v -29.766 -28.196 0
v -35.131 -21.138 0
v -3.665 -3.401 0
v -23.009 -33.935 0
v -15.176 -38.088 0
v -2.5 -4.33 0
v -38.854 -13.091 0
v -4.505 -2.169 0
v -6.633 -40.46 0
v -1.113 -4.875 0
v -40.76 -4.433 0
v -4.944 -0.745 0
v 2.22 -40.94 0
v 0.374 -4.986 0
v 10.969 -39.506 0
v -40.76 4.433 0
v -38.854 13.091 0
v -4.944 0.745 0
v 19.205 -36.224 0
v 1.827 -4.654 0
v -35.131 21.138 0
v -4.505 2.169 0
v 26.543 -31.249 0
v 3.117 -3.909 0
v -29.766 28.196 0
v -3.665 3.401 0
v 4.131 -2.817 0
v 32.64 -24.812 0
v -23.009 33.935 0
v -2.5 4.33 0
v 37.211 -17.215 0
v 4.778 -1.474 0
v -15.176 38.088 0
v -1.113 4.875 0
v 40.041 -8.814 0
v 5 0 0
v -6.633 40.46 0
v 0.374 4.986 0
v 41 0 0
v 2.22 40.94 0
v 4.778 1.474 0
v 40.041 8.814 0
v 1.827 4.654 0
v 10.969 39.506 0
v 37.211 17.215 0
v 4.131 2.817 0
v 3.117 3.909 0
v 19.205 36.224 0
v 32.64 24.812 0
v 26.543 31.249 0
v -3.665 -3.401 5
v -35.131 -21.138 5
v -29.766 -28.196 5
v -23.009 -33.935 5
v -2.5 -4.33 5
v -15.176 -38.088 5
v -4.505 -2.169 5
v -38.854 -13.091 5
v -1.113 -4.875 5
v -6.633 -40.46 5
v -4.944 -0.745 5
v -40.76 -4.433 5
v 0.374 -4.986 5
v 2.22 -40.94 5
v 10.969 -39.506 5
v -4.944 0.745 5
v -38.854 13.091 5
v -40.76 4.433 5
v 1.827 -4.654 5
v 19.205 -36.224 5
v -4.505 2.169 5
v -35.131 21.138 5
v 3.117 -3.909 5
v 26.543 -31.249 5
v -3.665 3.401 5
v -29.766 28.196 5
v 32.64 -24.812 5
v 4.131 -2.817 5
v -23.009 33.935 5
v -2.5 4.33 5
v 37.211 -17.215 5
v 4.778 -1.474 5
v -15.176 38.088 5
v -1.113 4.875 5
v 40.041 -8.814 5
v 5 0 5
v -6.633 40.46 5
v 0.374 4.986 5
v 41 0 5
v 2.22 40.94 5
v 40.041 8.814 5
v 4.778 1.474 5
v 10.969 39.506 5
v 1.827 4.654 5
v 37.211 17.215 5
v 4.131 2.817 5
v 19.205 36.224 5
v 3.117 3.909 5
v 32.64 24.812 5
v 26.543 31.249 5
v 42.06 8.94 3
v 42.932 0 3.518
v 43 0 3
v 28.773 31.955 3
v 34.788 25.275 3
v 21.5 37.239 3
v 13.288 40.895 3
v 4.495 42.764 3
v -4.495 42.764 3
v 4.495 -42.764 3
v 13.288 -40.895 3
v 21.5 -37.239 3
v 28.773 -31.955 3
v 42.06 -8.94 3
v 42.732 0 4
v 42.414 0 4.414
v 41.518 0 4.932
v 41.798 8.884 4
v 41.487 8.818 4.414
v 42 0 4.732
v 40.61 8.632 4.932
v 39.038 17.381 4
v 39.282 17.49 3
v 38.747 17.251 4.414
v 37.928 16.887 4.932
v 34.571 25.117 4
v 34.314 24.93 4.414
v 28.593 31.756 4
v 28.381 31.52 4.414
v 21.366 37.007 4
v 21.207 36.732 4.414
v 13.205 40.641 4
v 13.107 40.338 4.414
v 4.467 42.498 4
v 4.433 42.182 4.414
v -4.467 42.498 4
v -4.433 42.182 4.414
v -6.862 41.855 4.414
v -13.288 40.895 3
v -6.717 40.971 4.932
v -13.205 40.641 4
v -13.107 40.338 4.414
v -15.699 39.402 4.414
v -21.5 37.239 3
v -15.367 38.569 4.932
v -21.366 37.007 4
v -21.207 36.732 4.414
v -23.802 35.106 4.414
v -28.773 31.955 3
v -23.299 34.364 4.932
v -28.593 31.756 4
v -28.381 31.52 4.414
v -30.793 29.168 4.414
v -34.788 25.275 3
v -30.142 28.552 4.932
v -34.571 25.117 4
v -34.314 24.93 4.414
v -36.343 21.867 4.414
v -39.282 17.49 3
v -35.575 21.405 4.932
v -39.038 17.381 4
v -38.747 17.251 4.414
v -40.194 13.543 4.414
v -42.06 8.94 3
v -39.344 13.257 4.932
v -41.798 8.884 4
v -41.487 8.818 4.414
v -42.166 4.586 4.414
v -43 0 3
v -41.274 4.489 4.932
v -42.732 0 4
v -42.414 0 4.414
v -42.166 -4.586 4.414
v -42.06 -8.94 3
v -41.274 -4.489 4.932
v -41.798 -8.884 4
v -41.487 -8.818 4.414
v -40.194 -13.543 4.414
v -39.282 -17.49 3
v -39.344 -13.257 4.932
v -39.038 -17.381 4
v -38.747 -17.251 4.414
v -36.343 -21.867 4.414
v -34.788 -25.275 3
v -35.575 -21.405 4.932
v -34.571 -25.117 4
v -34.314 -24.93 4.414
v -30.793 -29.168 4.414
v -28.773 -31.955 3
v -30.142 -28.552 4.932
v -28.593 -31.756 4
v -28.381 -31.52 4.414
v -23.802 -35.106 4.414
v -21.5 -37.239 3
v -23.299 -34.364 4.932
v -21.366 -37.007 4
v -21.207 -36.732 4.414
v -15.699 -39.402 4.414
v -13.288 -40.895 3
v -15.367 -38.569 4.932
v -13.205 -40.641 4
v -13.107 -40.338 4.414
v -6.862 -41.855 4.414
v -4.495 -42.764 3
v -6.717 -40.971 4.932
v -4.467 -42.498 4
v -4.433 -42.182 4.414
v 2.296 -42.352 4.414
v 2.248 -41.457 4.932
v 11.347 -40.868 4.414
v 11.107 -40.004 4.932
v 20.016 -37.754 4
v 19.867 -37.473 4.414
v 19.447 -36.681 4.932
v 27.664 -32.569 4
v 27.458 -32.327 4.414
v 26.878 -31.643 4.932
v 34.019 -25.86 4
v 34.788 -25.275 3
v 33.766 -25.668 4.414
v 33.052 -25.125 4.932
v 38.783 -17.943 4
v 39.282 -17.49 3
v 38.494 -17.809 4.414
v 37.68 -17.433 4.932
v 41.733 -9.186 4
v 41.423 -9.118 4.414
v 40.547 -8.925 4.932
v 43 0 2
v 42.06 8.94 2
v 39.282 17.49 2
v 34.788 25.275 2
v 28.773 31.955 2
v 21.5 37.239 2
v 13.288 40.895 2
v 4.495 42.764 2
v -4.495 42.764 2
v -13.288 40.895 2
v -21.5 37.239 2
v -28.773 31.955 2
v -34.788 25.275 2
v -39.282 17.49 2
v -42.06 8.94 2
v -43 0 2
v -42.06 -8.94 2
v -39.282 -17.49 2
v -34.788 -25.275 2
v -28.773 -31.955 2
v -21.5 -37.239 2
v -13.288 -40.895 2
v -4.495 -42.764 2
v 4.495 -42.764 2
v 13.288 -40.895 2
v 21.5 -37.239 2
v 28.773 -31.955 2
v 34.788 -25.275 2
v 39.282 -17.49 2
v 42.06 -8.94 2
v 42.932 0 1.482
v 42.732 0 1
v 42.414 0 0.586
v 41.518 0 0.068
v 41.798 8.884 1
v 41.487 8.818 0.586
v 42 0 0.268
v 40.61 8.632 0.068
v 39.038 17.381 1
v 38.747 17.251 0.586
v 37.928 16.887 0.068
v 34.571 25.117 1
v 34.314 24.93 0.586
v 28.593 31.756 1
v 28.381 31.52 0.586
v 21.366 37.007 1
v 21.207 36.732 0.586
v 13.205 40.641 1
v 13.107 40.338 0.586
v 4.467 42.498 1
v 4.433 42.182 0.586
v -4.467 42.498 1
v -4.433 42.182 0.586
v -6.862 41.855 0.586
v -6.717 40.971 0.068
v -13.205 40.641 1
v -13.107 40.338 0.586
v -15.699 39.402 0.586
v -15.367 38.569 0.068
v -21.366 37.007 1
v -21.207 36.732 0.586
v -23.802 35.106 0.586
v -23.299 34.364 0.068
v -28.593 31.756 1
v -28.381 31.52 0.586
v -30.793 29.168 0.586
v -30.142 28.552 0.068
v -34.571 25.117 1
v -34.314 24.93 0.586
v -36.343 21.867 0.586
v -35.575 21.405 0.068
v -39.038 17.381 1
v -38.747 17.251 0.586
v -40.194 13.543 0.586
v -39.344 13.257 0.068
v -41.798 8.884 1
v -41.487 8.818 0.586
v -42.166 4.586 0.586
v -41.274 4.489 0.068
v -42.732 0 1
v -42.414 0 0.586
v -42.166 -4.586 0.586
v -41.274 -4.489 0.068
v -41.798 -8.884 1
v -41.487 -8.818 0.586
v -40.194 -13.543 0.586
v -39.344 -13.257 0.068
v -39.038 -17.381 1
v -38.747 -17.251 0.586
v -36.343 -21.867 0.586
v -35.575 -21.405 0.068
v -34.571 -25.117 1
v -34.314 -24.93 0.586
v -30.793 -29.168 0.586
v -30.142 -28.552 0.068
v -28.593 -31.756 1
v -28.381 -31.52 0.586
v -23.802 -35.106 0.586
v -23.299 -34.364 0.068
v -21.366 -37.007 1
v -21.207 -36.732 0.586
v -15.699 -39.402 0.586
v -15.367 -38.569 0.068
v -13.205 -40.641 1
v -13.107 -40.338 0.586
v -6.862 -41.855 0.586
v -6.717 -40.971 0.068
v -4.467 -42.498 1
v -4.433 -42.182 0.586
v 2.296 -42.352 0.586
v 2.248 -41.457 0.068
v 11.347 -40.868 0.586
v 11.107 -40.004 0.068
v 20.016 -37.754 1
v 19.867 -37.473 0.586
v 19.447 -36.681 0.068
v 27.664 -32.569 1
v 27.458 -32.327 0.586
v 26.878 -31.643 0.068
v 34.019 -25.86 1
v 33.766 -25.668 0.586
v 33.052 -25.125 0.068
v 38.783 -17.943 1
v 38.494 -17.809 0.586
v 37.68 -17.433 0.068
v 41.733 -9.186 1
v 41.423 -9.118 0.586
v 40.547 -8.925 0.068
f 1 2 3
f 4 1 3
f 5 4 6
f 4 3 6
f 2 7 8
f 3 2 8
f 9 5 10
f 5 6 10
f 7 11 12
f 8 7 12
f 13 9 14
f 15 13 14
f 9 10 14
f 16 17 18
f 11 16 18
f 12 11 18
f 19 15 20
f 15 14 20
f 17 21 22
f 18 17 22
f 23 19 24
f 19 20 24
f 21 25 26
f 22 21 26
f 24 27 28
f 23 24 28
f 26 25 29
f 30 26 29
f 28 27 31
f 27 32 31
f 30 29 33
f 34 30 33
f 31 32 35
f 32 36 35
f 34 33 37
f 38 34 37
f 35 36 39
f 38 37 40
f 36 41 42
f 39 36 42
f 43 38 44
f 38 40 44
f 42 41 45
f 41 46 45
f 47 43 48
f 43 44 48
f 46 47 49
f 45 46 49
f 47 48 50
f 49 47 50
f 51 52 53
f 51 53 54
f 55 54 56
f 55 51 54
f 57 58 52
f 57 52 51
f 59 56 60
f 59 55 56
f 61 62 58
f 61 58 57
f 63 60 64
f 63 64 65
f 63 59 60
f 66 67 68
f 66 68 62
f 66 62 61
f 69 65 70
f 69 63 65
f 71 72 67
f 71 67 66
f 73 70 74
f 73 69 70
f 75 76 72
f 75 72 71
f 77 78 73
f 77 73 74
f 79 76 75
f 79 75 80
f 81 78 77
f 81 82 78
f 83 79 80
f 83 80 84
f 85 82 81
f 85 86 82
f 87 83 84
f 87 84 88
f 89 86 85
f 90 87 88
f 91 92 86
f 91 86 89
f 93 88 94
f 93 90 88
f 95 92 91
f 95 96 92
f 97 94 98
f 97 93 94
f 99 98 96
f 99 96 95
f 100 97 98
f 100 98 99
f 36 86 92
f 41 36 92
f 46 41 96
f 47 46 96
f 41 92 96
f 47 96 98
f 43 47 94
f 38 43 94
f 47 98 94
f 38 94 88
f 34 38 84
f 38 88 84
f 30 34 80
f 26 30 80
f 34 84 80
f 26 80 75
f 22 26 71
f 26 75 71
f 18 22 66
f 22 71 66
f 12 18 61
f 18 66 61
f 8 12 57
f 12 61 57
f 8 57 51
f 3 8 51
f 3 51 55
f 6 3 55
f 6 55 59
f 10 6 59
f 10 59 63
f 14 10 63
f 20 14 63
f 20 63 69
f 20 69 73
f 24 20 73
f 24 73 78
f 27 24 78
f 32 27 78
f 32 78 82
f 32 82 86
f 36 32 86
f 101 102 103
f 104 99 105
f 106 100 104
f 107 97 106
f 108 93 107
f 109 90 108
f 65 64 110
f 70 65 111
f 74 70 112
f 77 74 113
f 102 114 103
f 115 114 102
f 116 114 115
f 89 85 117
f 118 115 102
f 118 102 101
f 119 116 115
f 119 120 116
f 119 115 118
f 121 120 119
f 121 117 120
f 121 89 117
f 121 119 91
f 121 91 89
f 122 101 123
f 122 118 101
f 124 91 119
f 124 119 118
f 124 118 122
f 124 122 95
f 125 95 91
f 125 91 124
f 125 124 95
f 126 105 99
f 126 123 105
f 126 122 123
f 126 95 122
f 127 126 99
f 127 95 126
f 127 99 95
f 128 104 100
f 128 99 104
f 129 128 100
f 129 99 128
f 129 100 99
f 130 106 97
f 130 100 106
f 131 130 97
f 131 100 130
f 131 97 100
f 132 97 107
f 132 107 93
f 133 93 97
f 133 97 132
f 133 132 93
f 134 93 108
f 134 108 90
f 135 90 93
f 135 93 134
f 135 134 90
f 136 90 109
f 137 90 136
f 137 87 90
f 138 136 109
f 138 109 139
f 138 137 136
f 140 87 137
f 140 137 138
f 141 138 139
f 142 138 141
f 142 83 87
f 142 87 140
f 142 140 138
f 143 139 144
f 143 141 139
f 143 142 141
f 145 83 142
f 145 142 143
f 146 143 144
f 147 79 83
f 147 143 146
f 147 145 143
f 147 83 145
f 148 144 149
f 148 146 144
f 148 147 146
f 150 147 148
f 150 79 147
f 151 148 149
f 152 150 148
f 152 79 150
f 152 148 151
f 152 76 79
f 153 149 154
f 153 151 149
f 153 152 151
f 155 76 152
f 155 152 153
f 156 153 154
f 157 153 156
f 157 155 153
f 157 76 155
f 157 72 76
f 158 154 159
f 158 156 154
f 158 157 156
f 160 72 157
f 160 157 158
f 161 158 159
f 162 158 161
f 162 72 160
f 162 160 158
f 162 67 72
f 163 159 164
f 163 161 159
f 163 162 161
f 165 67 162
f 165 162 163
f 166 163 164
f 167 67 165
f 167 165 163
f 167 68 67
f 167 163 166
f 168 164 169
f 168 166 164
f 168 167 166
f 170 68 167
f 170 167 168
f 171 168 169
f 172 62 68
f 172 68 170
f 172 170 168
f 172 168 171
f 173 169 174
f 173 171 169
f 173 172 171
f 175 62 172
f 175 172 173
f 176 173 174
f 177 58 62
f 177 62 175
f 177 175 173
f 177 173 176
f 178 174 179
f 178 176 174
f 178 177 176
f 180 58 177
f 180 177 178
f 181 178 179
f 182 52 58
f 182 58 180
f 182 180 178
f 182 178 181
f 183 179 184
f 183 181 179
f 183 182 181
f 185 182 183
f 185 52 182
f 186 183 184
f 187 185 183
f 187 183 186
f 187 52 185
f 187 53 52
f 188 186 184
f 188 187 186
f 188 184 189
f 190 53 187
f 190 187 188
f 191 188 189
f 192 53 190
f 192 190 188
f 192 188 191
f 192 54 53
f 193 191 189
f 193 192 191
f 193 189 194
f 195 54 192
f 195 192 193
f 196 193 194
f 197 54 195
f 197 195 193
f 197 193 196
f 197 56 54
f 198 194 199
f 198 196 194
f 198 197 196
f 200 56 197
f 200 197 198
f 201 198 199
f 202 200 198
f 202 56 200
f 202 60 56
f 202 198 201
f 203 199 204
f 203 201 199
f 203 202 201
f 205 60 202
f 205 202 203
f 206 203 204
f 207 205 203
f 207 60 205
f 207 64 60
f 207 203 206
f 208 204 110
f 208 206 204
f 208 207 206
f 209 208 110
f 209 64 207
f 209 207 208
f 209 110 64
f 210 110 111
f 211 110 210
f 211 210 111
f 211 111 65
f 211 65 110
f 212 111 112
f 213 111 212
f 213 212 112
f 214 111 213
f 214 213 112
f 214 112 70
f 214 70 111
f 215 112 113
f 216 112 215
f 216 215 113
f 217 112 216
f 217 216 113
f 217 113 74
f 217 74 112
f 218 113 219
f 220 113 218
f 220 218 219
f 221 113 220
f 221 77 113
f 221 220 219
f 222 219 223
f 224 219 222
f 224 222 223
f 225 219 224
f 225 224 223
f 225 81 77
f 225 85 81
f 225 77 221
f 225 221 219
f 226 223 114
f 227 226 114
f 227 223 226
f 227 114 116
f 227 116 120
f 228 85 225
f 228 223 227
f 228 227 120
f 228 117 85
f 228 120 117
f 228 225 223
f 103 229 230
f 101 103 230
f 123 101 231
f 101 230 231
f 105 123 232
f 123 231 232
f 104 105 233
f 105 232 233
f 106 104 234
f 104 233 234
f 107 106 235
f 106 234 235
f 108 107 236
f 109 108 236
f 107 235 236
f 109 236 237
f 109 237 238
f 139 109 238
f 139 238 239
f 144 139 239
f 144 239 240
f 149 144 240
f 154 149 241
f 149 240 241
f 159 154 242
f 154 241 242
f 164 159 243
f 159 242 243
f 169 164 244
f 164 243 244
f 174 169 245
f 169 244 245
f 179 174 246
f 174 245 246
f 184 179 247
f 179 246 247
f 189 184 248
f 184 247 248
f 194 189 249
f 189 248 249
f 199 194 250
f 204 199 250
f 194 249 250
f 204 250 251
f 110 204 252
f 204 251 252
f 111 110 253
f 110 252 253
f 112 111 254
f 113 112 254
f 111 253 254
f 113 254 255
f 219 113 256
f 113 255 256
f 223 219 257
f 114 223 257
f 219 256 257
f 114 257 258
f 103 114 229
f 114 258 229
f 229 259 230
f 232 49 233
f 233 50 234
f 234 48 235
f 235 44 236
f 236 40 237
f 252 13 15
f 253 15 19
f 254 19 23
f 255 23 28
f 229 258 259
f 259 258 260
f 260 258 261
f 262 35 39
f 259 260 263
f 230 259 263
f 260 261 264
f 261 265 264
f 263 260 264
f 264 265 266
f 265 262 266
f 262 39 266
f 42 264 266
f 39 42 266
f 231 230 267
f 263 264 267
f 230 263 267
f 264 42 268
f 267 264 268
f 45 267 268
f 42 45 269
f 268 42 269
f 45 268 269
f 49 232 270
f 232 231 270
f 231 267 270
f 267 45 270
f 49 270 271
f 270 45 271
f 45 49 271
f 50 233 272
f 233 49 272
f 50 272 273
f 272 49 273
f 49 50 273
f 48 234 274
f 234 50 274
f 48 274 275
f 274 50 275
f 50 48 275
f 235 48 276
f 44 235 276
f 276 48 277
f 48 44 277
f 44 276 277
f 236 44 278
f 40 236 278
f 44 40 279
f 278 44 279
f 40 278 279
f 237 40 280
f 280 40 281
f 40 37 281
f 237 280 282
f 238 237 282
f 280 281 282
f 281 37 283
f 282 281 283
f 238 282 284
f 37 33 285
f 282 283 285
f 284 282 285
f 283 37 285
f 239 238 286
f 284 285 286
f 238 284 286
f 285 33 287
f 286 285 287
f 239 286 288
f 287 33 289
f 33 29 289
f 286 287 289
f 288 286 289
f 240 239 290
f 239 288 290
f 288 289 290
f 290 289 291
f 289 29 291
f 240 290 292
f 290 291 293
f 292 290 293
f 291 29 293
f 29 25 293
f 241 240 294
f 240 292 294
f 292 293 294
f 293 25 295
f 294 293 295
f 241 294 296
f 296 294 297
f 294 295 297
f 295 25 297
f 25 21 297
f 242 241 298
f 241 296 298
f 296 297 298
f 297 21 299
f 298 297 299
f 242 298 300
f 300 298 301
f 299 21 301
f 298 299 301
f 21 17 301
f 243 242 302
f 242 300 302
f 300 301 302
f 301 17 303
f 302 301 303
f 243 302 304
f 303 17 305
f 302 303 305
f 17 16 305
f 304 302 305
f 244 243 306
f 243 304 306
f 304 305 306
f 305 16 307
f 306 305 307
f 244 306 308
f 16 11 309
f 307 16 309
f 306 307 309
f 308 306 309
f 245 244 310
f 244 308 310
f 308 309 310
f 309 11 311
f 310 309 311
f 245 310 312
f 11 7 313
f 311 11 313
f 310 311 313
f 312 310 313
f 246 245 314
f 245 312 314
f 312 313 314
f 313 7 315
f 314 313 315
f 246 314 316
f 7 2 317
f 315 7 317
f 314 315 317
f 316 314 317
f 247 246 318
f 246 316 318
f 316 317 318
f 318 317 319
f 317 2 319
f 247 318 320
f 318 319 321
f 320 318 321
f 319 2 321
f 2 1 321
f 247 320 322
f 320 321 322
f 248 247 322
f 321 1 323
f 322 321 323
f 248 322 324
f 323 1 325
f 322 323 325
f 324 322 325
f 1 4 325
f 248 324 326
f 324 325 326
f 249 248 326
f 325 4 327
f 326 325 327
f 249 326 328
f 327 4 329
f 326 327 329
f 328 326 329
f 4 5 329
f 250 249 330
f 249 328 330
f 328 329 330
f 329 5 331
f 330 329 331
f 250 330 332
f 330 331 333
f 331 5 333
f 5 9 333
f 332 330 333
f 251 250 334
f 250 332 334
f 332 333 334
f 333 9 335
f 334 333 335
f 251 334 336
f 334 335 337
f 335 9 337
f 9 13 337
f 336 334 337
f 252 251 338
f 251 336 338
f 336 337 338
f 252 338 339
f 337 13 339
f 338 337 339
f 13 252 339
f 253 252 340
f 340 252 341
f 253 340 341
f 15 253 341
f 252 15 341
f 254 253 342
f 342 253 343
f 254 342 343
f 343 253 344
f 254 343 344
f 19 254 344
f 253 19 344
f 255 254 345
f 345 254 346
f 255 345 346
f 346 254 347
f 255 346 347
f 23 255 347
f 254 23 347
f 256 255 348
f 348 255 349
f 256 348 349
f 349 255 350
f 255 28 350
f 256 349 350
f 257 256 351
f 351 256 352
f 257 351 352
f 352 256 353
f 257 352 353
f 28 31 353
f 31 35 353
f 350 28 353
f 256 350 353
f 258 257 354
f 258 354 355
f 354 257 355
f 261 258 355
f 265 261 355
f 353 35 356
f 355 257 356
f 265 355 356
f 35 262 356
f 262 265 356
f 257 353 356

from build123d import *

# Parameters (mm, degrees)
F0_R     = 43
F1_DEPTH = 5
F2_R     = 5
F3_DEPTH = 5.001
F4_R     = 2


with BuildPart() as f1:
    # F0 (on Top) → F1 (new body)
    with BuildSketch(Plane.XY):
        Circle(F0_R)
    extrude(amount=F1_DEPTH)

    # F2 (on face) → F3 (cut, through all)
    with BuildSketch(Plane.XY.offset(5)):
        Circle(F2_R)
    extrude(amount=-F3_DEPTH, mode=Mode.SUBTRACT)

    # F4
    f4_edges = [f1.edges().sort_by_distance(p)[0] for p in [
        (-43, 0, 0),
        (-43, 0, 5),
    ]]
    fillet(f4_edges, radius=F4_R)


solid = f1.part
